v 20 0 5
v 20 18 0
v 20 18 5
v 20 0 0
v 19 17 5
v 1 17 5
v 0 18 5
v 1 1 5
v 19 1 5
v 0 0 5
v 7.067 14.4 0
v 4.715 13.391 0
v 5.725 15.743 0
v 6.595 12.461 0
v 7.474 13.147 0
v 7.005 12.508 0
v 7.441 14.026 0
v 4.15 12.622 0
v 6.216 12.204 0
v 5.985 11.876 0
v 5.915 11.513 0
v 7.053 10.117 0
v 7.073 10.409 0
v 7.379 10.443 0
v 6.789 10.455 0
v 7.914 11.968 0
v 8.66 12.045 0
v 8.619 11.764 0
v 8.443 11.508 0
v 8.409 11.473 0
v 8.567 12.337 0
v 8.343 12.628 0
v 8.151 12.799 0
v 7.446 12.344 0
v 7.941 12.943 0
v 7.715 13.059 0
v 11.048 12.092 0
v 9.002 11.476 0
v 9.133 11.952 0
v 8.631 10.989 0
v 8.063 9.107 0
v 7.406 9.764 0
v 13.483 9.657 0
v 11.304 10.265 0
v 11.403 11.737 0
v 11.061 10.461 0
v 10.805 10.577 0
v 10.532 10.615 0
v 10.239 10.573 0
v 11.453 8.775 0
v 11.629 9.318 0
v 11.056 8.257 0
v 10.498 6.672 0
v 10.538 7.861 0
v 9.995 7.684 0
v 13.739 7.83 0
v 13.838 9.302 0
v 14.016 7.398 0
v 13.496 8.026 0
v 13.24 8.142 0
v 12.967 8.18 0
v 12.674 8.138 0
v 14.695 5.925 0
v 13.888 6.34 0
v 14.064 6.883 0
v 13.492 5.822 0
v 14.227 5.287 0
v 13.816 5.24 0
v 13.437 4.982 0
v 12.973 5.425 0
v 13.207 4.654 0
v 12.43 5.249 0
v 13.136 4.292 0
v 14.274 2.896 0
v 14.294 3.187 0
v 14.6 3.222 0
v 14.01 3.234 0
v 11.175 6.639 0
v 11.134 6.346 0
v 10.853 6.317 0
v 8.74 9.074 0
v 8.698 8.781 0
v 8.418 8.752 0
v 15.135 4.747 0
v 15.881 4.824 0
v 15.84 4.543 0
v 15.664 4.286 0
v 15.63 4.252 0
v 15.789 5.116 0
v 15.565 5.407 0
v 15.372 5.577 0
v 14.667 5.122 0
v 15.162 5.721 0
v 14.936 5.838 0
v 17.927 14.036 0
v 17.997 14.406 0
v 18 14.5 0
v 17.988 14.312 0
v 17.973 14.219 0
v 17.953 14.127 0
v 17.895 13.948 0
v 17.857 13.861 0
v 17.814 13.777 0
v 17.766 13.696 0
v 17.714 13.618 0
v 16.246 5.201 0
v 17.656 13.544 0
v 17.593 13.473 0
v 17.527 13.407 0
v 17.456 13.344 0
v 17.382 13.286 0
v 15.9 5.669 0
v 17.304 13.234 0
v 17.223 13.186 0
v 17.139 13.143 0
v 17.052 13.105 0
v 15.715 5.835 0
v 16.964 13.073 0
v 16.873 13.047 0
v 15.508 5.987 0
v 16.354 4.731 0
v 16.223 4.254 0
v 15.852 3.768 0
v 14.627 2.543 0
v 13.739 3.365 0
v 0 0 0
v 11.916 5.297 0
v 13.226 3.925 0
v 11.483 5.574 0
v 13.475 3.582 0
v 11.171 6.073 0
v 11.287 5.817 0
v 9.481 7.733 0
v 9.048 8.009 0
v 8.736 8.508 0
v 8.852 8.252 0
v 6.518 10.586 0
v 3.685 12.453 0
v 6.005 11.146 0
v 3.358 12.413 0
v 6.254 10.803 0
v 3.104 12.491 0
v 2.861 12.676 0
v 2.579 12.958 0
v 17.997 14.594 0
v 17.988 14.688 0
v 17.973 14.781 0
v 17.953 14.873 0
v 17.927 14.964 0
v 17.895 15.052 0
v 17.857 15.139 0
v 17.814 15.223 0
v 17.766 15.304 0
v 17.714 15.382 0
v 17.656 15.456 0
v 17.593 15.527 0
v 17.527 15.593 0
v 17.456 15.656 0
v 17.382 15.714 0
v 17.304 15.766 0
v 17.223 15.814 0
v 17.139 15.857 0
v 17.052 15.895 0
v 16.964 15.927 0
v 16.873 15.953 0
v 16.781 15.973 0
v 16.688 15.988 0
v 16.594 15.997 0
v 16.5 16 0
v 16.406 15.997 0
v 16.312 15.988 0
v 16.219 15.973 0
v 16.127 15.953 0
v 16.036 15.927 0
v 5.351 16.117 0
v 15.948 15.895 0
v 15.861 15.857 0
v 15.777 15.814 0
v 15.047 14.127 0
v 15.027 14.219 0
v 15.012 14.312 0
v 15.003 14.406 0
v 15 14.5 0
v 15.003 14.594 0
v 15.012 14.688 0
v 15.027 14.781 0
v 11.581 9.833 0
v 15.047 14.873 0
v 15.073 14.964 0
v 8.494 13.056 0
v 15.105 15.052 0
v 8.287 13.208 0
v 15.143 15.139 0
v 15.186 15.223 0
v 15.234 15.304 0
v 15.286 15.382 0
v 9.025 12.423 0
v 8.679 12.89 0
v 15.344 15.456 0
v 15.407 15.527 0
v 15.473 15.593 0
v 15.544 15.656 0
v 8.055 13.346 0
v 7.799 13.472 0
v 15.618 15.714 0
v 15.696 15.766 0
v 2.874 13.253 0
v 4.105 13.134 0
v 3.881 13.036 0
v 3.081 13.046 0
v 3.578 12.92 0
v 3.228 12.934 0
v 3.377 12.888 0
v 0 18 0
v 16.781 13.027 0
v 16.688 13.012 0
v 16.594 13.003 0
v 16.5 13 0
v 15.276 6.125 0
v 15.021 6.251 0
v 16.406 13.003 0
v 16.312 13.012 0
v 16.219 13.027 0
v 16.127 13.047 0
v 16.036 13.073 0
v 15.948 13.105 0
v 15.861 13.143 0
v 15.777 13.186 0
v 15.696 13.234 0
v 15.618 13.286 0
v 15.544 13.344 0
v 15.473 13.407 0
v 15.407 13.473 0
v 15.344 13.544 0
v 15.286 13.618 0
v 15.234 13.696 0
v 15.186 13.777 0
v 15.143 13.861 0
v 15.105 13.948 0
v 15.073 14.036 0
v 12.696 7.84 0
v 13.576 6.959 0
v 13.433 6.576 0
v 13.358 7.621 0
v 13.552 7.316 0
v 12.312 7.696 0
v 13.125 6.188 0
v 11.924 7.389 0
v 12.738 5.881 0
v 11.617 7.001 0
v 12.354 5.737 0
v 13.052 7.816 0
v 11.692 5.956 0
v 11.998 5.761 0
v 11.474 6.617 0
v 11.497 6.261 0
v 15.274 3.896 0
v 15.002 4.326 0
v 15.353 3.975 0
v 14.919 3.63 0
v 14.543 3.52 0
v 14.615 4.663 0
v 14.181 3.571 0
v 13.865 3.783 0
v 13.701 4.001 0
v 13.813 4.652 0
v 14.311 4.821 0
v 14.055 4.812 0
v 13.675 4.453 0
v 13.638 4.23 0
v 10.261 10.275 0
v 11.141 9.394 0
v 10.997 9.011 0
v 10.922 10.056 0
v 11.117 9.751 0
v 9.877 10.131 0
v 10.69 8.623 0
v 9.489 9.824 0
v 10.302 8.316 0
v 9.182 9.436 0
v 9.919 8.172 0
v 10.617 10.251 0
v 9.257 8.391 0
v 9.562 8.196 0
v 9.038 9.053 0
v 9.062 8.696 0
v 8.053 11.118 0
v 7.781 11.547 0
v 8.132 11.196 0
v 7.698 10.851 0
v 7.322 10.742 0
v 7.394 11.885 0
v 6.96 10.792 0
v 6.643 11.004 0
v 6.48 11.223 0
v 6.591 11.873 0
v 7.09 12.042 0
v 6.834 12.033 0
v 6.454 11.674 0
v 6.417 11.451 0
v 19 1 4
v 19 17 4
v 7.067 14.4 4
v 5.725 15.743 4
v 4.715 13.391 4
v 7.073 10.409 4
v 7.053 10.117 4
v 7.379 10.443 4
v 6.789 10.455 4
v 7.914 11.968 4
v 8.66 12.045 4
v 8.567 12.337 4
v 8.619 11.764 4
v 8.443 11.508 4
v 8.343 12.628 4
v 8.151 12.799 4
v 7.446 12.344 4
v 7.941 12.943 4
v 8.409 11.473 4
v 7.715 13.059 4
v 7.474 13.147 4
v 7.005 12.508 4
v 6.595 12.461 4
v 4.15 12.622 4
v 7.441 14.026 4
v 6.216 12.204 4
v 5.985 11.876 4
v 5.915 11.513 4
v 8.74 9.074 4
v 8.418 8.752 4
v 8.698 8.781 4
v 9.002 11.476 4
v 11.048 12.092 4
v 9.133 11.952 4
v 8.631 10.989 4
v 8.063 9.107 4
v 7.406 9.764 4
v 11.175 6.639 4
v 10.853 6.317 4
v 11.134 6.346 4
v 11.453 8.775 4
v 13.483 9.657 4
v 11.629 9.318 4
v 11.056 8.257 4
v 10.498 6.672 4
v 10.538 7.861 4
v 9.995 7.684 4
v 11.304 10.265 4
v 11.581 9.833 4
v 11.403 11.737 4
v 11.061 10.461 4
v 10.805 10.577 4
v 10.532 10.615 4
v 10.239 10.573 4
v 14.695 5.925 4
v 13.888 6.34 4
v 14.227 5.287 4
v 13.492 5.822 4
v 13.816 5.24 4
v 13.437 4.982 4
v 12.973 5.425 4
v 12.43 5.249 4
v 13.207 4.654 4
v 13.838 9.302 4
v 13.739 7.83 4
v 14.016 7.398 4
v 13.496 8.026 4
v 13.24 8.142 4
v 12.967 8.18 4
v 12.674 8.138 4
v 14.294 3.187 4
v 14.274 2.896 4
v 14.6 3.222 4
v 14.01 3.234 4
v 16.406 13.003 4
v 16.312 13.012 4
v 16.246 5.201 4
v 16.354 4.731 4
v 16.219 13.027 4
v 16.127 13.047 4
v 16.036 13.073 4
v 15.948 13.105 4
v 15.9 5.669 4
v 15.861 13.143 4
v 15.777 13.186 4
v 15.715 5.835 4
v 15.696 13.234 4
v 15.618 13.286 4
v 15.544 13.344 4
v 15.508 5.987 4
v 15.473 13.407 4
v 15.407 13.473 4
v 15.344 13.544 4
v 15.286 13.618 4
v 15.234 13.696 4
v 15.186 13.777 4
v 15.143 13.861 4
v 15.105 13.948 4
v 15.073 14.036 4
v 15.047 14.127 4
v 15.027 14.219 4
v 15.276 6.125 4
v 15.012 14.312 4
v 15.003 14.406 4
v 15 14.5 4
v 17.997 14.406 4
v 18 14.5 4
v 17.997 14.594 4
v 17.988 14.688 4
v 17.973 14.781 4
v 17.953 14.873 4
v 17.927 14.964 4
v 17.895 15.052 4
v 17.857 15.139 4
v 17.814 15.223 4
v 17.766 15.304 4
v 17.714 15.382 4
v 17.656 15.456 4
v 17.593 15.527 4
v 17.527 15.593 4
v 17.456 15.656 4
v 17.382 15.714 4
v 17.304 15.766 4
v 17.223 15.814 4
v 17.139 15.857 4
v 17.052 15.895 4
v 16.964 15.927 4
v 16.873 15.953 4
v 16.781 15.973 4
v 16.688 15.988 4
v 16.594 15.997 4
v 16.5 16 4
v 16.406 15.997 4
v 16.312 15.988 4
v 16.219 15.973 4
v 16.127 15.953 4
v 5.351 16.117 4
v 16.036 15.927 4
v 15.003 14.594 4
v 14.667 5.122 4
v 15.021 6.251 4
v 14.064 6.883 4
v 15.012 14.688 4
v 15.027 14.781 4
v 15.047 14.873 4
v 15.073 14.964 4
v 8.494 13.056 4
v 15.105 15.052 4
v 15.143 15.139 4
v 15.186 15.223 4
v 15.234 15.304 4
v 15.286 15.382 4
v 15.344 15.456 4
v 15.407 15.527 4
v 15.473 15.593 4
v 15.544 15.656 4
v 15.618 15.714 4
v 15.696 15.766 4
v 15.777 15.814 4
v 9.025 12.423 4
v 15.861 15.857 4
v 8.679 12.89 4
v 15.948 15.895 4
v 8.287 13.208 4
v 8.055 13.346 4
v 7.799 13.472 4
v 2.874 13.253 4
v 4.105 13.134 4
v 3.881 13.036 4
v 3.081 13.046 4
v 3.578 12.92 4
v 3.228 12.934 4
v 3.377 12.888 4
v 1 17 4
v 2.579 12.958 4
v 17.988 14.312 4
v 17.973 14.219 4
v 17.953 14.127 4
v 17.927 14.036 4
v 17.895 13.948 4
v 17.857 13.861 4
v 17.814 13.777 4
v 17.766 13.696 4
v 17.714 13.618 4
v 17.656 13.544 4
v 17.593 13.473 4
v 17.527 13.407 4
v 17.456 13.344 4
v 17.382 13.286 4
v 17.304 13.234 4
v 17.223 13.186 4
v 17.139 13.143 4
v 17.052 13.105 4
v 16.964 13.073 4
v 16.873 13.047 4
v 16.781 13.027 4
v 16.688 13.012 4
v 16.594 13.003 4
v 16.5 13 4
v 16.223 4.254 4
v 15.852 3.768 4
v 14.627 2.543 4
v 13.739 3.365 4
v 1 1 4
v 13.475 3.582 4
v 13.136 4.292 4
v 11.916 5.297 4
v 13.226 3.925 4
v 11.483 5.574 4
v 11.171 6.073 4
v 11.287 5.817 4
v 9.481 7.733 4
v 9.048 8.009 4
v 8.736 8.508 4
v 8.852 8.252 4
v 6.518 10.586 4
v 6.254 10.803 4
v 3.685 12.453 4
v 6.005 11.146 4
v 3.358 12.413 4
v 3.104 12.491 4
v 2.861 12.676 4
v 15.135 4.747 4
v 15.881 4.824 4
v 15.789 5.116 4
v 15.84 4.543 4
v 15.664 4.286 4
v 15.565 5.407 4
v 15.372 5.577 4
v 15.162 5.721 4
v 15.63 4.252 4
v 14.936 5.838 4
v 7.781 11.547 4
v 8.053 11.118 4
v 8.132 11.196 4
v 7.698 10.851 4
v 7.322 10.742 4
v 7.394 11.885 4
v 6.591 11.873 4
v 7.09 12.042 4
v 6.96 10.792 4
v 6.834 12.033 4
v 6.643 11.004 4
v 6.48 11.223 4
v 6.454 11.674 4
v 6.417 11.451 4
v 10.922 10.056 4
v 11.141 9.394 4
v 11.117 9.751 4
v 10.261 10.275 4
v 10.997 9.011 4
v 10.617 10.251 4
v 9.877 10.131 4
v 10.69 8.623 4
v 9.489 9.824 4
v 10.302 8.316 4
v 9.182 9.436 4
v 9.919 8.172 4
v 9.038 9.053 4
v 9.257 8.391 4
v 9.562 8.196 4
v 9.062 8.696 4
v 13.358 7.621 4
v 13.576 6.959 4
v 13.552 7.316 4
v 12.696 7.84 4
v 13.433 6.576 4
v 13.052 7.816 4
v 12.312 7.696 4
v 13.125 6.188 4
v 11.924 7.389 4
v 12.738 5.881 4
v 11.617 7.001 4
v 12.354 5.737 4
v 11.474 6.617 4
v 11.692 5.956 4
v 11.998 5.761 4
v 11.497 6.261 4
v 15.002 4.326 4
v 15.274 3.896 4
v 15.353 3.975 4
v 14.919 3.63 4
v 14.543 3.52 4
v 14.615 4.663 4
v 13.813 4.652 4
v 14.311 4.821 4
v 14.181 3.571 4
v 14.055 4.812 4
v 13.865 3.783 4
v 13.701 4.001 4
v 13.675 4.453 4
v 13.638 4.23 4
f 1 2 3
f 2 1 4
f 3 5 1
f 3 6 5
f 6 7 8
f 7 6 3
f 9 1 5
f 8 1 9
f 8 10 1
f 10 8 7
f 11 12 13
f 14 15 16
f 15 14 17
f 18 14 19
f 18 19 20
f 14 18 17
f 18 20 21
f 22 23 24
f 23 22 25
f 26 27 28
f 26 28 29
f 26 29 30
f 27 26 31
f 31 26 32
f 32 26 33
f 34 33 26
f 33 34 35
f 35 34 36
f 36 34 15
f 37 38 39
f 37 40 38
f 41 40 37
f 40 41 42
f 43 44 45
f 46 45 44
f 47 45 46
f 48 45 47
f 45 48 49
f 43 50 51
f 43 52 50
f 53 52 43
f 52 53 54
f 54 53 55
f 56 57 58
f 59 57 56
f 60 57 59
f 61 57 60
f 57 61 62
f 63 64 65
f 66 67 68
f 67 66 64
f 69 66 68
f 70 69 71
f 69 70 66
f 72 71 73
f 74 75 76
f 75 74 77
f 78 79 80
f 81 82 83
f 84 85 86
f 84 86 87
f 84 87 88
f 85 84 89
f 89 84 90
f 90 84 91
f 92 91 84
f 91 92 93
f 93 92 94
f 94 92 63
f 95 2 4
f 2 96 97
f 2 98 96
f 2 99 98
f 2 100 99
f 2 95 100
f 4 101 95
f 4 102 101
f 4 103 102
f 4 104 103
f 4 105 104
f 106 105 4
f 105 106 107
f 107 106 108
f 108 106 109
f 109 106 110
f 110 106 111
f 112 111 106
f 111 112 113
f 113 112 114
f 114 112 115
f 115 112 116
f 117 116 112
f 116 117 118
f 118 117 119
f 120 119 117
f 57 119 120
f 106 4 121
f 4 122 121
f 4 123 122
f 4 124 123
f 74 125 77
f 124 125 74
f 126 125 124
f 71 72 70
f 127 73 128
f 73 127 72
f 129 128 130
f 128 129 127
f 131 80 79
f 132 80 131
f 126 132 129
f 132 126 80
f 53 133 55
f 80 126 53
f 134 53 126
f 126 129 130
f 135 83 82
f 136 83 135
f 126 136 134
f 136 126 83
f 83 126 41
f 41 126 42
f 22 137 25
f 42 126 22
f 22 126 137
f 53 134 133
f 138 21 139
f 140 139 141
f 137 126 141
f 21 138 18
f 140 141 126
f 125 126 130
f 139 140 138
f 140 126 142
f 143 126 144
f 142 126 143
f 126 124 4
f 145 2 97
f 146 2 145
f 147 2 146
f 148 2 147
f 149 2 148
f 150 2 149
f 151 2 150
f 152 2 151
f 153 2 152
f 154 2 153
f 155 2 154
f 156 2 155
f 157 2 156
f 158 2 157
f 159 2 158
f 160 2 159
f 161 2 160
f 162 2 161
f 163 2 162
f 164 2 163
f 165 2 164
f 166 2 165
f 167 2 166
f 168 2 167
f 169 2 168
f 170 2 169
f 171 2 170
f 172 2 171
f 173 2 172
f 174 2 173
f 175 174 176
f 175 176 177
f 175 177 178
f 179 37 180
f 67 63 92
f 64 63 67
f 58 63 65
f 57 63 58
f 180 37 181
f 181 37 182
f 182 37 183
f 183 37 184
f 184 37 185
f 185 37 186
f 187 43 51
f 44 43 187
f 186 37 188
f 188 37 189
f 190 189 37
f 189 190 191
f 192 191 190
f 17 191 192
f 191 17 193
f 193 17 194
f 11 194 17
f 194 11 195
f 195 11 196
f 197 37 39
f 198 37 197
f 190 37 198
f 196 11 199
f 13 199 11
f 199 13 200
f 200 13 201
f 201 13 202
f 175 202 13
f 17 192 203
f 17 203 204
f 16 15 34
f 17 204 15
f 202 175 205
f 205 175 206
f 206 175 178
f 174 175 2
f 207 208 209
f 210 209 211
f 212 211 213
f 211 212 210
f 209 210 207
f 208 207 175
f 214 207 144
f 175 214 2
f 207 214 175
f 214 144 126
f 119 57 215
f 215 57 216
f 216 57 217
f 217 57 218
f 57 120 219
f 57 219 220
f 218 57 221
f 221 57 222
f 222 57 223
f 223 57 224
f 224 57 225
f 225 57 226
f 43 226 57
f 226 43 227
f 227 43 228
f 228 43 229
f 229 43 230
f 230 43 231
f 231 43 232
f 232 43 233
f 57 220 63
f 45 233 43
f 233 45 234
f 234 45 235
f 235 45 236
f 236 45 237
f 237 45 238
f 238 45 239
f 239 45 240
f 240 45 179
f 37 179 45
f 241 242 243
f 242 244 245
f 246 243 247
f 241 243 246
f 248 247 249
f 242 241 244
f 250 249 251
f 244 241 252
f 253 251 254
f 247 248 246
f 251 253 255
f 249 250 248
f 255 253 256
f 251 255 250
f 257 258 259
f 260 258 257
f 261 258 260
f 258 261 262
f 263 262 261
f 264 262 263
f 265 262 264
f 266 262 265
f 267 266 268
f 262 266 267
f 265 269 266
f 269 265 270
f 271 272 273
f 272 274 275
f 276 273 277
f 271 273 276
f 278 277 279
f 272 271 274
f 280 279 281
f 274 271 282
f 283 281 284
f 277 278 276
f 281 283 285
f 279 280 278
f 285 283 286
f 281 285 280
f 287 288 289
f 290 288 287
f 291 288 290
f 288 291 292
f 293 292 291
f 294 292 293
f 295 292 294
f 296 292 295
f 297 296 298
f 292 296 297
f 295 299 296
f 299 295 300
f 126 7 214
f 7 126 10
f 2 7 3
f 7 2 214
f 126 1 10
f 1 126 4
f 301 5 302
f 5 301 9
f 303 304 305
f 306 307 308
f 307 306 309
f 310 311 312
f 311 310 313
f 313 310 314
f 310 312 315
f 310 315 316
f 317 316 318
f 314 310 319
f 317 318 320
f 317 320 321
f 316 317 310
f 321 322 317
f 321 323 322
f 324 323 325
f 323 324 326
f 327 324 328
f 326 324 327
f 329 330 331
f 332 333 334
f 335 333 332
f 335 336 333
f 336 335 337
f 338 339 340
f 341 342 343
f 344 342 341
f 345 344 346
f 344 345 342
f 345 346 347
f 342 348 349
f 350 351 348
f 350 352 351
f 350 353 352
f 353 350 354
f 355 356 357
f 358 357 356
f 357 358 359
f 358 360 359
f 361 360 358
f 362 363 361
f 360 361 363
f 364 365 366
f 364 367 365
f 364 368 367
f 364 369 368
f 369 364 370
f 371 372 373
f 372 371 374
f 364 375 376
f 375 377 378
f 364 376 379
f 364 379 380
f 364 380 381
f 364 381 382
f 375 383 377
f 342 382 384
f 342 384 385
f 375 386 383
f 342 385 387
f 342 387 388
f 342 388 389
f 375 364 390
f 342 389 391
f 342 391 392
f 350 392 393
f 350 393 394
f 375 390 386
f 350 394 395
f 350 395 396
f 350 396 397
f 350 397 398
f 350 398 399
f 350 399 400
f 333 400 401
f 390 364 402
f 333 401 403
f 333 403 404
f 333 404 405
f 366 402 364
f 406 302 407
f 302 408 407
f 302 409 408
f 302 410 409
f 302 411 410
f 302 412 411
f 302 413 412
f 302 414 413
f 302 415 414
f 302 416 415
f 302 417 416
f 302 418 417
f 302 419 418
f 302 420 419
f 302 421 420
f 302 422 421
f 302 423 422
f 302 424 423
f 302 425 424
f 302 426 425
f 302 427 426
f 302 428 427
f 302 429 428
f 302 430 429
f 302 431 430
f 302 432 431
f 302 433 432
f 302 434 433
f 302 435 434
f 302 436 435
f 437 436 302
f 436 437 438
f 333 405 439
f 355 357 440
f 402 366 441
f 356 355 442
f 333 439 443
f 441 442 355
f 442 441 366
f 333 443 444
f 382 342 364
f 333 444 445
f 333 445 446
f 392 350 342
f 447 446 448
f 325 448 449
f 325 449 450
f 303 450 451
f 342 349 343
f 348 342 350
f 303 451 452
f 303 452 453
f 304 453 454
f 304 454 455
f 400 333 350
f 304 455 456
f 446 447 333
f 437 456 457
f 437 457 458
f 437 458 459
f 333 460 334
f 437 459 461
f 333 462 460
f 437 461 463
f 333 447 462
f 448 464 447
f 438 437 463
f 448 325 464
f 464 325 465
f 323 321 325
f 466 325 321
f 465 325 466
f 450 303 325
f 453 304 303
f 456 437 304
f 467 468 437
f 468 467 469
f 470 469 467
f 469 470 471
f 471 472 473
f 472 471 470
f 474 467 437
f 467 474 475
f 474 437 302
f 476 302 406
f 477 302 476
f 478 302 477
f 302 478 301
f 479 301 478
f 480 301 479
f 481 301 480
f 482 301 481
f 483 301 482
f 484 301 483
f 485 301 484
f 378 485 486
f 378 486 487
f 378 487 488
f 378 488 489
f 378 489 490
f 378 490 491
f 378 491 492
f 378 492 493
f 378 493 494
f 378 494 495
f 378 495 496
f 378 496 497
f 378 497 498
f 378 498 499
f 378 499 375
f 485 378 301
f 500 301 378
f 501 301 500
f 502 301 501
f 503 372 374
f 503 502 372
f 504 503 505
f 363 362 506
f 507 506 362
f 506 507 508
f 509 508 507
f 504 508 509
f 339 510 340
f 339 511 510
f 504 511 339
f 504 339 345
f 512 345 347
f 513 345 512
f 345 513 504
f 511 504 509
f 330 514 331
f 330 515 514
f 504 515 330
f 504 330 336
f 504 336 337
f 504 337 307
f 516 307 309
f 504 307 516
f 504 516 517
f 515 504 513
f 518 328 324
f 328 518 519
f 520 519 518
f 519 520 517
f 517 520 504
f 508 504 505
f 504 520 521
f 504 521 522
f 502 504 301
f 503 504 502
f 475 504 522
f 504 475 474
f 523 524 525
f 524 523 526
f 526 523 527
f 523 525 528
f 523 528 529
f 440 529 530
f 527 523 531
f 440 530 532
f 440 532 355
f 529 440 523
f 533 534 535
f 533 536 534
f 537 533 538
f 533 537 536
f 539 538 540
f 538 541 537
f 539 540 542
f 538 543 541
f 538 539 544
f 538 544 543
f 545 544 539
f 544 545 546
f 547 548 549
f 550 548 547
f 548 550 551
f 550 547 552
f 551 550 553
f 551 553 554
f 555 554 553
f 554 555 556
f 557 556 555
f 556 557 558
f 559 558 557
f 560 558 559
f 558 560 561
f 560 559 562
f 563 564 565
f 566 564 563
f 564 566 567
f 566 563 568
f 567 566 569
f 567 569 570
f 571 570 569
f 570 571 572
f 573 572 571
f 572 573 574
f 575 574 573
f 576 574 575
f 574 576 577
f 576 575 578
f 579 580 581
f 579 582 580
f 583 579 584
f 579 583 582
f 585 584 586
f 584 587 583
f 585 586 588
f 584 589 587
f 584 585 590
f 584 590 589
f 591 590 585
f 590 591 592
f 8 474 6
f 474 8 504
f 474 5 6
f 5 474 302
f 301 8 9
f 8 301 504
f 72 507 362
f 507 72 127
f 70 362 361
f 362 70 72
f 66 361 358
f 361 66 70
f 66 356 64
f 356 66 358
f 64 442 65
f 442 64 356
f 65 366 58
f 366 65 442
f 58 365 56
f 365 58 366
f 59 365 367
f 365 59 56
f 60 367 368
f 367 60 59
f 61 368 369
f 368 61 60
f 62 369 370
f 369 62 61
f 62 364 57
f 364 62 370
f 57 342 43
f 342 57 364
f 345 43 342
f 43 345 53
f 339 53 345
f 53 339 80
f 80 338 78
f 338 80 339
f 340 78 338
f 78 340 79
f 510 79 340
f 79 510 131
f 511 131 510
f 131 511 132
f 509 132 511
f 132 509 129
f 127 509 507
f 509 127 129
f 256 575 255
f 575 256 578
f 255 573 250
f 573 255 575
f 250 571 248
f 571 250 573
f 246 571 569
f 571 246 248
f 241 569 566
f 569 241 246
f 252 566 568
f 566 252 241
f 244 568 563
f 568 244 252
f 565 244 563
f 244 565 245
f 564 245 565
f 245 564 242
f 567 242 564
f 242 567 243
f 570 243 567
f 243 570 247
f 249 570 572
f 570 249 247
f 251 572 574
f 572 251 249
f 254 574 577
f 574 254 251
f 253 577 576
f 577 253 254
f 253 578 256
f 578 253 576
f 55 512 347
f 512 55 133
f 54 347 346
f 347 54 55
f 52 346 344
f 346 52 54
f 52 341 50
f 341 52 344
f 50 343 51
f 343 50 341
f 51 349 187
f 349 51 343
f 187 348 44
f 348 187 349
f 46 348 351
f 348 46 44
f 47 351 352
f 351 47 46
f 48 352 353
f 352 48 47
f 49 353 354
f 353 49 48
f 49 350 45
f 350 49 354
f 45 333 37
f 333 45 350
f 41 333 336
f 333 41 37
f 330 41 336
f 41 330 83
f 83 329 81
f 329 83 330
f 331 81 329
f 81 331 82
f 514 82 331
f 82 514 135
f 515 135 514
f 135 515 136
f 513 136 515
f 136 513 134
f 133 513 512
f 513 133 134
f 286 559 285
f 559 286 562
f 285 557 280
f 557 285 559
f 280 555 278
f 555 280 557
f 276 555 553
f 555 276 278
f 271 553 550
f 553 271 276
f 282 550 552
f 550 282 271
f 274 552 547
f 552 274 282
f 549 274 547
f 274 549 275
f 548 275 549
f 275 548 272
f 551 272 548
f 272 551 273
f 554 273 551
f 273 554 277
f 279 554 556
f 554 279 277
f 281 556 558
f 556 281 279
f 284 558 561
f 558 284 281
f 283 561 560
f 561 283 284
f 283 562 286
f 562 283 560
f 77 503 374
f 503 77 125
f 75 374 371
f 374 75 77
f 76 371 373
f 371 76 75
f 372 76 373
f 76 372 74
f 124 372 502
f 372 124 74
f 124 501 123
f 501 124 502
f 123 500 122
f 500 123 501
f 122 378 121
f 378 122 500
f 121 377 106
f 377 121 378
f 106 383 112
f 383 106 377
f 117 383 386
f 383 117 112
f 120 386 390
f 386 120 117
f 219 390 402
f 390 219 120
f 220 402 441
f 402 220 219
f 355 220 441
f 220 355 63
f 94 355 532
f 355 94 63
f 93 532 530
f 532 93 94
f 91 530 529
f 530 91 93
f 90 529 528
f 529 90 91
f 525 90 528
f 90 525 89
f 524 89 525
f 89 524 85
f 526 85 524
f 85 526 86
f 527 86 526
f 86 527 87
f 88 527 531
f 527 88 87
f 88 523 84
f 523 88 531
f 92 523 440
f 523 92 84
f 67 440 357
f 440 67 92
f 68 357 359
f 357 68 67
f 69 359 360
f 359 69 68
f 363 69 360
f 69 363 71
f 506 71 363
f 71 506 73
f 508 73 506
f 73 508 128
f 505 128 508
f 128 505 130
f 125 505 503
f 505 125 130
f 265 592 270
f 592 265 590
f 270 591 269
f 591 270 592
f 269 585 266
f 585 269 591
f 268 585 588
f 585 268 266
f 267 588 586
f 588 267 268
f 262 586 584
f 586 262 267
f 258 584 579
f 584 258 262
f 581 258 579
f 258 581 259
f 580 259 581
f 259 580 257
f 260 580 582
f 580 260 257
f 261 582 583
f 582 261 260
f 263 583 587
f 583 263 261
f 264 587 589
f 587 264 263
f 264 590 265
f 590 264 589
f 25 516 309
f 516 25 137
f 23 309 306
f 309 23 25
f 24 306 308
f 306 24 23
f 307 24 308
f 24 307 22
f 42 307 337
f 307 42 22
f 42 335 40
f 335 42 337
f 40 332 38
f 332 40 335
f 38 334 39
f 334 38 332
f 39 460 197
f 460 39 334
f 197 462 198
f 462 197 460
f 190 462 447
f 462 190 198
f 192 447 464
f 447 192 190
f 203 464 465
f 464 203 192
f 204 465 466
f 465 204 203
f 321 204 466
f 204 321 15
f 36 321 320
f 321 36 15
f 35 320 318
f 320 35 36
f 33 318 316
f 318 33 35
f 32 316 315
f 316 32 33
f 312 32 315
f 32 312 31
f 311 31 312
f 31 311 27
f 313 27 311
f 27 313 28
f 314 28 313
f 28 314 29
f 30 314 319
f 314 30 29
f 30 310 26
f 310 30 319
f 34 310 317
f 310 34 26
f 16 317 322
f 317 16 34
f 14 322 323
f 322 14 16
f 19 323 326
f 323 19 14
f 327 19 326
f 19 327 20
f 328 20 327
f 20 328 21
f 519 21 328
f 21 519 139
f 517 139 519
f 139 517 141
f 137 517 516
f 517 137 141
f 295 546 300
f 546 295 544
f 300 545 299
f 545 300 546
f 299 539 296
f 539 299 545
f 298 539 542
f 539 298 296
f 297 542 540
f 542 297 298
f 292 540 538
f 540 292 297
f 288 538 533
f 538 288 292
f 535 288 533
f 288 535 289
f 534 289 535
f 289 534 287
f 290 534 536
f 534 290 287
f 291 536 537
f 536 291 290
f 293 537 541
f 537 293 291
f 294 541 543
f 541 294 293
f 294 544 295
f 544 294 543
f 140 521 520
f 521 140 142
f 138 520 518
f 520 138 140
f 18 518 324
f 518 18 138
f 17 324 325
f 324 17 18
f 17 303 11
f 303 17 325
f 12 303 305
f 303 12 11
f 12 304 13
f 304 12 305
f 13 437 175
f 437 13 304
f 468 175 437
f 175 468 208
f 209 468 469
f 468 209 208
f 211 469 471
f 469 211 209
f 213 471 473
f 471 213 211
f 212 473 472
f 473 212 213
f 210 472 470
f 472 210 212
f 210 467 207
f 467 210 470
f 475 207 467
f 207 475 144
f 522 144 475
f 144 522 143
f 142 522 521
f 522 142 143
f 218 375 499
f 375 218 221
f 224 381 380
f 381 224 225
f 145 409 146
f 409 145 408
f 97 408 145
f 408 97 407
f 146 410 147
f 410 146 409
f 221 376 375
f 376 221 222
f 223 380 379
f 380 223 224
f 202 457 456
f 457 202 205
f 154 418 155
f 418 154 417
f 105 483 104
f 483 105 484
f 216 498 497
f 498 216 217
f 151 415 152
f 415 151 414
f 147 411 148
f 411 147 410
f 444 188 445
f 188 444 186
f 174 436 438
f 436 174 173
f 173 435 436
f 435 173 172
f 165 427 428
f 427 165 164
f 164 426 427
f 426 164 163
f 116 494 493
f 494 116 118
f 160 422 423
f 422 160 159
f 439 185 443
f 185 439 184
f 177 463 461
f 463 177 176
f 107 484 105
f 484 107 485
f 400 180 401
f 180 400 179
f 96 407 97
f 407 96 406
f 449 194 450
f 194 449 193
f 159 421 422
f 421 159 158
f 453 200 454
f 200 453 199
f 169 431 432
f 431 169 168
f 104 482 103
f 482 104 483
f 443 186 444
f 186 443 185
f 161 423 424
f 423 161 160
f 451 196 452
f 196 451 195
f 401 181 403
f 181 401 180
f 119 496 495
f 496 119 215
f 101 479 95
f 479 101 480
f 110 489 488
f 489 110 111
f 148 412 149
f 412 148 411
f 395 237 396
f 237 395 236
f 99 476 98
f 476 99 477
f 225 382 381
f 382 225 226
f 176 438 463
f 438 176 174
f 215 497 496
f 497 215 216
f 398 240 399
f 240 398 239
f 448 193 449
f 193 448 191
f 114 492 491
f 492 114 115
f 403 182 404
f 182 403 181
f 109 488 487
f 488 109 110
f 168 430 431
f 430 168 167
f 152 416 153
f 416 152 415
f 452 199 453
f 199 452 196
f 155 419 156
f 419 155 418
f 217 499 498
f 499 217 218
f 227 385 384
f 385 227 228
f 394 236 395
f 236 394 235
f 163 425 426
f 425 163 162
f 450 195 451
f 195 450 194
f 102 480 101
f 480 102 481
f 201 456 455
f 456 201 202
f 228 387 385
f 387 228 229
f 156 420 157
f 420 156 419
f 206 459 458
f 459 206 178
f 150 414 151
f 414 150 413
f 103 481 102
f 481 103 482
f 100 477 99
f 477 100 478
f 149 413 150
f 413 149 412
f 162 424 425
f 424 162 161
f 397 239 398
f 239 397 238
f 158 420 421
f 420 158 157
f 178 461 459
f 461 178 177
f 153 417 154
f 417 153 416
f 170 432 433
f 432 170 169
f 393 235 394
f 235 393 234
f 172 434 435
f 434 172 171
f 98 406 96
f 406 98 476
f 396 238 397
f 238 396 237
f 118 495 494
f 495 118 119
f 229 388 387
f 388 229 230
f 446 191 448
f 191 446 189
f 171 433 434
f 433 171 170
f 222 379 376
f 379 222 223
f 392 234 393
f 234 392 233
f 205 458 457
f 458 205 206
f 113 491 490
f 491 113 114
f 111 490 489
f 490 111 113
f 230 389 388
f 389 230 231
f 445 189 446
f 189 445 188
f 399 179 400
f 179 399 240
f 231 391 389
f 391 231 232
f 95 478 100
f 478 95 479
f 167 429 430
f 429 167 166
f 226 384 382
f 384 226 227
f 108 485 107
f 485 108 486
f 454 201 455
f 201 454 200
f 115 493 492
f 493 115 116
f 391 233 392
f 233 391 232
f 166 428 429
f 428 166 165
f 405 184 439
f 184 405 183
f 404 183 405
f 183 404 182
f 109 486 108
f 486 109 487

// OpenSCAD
difference() {
    cube([20, 18, 5]);
    translate([1, 1, 4]) {
        cube([18,16,1]);
    };
    translate([6, 17, 0]) {
        rotate([0,0,-45]) {
            linear_extrude(height = 15) {
                text("yabba", size = 4, halign="left", valign="top",font = "Courier 10 Pitch");
            };
        };
    };
    translate([16.5, 14.5, 0]) {
        cylinder(h=6, r=1.5, $fn=100);
    }
};
